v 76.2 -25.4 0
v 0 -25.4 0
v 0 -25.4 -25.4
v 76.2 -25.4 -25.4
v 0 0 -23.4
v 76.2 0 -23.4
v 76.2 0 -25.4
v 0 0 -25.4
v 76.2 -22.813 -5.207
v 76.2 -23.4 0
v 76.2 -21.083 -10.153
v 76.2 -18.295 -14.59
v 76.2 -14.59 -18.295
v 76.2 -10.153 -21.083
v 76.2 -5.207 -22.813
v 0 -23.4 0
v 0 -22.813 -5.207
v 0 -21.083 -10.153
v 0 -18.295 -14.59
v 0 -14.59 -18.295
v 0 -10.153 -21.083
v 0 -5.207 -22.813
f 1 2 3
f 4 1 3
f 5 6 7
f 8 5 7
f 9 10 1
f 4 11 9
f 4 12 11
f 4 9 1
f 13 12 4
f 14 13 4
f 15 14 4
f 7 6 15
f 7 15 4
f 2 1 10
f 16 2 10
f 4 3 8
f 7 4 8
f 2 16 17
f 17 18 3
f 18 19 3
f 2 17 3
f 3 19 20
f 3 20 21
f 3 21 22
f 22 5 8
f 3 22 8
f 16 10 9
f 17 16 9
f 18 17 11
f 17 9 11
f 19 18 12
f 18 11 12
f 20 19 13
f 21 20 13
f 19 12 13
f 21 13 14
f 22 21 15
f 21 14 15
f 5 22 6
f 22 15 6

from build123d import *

# Parameters (mm, degrees)
SKETCH1_W           = 50.8
SKETCH1_H           = 50.8
BOSS_EXTRUDE1_DEPTH = 76.2
CUT_EXTRUDE1_DEPTH  = 76.2


with BuildPart() as part:
    # Sketch1 → Boss-Extrude1 (new body)
    with BuildSketch(Plane(origin=(0, 0, 0), x_dir=(0, 0, -1), z_dir=(1, 0, 0))):
        Rectangle(SKETCH1_W, SKETCH1_H)
    extrude(amount=BOSS_EXTRUDE1_DEPTH)

    # Sketch2 → Cut-Extrude1 (cut)
    with BuildSketch(Plane(origin=(76.2, 0, 0), x_dir=(0, 0, -1), z_dir=(1, 0, 0))):
        with BuildLine():
            Line((0, -25.4), (0, -23.4))
            ThreePointArc((0, -23.4), (16.54629868, -16.54629868), (23.4, 0))
            Line((23.4, 0), (25.4, 0))
            Line((25.4, 0), (25.4, 25.4))
            Line((25.4, 25.4), (-25.4, 25.4))
            Line((-25.4, 25.4), (-25.4, -25.4))
            Line((-25.4, -25.4), (0, -25.4))
        make_face()
    extrude(amount=-CUT_EXTRUDE1_DEPTH, mode=Mode.SUBTRACT)


solid = part.part
